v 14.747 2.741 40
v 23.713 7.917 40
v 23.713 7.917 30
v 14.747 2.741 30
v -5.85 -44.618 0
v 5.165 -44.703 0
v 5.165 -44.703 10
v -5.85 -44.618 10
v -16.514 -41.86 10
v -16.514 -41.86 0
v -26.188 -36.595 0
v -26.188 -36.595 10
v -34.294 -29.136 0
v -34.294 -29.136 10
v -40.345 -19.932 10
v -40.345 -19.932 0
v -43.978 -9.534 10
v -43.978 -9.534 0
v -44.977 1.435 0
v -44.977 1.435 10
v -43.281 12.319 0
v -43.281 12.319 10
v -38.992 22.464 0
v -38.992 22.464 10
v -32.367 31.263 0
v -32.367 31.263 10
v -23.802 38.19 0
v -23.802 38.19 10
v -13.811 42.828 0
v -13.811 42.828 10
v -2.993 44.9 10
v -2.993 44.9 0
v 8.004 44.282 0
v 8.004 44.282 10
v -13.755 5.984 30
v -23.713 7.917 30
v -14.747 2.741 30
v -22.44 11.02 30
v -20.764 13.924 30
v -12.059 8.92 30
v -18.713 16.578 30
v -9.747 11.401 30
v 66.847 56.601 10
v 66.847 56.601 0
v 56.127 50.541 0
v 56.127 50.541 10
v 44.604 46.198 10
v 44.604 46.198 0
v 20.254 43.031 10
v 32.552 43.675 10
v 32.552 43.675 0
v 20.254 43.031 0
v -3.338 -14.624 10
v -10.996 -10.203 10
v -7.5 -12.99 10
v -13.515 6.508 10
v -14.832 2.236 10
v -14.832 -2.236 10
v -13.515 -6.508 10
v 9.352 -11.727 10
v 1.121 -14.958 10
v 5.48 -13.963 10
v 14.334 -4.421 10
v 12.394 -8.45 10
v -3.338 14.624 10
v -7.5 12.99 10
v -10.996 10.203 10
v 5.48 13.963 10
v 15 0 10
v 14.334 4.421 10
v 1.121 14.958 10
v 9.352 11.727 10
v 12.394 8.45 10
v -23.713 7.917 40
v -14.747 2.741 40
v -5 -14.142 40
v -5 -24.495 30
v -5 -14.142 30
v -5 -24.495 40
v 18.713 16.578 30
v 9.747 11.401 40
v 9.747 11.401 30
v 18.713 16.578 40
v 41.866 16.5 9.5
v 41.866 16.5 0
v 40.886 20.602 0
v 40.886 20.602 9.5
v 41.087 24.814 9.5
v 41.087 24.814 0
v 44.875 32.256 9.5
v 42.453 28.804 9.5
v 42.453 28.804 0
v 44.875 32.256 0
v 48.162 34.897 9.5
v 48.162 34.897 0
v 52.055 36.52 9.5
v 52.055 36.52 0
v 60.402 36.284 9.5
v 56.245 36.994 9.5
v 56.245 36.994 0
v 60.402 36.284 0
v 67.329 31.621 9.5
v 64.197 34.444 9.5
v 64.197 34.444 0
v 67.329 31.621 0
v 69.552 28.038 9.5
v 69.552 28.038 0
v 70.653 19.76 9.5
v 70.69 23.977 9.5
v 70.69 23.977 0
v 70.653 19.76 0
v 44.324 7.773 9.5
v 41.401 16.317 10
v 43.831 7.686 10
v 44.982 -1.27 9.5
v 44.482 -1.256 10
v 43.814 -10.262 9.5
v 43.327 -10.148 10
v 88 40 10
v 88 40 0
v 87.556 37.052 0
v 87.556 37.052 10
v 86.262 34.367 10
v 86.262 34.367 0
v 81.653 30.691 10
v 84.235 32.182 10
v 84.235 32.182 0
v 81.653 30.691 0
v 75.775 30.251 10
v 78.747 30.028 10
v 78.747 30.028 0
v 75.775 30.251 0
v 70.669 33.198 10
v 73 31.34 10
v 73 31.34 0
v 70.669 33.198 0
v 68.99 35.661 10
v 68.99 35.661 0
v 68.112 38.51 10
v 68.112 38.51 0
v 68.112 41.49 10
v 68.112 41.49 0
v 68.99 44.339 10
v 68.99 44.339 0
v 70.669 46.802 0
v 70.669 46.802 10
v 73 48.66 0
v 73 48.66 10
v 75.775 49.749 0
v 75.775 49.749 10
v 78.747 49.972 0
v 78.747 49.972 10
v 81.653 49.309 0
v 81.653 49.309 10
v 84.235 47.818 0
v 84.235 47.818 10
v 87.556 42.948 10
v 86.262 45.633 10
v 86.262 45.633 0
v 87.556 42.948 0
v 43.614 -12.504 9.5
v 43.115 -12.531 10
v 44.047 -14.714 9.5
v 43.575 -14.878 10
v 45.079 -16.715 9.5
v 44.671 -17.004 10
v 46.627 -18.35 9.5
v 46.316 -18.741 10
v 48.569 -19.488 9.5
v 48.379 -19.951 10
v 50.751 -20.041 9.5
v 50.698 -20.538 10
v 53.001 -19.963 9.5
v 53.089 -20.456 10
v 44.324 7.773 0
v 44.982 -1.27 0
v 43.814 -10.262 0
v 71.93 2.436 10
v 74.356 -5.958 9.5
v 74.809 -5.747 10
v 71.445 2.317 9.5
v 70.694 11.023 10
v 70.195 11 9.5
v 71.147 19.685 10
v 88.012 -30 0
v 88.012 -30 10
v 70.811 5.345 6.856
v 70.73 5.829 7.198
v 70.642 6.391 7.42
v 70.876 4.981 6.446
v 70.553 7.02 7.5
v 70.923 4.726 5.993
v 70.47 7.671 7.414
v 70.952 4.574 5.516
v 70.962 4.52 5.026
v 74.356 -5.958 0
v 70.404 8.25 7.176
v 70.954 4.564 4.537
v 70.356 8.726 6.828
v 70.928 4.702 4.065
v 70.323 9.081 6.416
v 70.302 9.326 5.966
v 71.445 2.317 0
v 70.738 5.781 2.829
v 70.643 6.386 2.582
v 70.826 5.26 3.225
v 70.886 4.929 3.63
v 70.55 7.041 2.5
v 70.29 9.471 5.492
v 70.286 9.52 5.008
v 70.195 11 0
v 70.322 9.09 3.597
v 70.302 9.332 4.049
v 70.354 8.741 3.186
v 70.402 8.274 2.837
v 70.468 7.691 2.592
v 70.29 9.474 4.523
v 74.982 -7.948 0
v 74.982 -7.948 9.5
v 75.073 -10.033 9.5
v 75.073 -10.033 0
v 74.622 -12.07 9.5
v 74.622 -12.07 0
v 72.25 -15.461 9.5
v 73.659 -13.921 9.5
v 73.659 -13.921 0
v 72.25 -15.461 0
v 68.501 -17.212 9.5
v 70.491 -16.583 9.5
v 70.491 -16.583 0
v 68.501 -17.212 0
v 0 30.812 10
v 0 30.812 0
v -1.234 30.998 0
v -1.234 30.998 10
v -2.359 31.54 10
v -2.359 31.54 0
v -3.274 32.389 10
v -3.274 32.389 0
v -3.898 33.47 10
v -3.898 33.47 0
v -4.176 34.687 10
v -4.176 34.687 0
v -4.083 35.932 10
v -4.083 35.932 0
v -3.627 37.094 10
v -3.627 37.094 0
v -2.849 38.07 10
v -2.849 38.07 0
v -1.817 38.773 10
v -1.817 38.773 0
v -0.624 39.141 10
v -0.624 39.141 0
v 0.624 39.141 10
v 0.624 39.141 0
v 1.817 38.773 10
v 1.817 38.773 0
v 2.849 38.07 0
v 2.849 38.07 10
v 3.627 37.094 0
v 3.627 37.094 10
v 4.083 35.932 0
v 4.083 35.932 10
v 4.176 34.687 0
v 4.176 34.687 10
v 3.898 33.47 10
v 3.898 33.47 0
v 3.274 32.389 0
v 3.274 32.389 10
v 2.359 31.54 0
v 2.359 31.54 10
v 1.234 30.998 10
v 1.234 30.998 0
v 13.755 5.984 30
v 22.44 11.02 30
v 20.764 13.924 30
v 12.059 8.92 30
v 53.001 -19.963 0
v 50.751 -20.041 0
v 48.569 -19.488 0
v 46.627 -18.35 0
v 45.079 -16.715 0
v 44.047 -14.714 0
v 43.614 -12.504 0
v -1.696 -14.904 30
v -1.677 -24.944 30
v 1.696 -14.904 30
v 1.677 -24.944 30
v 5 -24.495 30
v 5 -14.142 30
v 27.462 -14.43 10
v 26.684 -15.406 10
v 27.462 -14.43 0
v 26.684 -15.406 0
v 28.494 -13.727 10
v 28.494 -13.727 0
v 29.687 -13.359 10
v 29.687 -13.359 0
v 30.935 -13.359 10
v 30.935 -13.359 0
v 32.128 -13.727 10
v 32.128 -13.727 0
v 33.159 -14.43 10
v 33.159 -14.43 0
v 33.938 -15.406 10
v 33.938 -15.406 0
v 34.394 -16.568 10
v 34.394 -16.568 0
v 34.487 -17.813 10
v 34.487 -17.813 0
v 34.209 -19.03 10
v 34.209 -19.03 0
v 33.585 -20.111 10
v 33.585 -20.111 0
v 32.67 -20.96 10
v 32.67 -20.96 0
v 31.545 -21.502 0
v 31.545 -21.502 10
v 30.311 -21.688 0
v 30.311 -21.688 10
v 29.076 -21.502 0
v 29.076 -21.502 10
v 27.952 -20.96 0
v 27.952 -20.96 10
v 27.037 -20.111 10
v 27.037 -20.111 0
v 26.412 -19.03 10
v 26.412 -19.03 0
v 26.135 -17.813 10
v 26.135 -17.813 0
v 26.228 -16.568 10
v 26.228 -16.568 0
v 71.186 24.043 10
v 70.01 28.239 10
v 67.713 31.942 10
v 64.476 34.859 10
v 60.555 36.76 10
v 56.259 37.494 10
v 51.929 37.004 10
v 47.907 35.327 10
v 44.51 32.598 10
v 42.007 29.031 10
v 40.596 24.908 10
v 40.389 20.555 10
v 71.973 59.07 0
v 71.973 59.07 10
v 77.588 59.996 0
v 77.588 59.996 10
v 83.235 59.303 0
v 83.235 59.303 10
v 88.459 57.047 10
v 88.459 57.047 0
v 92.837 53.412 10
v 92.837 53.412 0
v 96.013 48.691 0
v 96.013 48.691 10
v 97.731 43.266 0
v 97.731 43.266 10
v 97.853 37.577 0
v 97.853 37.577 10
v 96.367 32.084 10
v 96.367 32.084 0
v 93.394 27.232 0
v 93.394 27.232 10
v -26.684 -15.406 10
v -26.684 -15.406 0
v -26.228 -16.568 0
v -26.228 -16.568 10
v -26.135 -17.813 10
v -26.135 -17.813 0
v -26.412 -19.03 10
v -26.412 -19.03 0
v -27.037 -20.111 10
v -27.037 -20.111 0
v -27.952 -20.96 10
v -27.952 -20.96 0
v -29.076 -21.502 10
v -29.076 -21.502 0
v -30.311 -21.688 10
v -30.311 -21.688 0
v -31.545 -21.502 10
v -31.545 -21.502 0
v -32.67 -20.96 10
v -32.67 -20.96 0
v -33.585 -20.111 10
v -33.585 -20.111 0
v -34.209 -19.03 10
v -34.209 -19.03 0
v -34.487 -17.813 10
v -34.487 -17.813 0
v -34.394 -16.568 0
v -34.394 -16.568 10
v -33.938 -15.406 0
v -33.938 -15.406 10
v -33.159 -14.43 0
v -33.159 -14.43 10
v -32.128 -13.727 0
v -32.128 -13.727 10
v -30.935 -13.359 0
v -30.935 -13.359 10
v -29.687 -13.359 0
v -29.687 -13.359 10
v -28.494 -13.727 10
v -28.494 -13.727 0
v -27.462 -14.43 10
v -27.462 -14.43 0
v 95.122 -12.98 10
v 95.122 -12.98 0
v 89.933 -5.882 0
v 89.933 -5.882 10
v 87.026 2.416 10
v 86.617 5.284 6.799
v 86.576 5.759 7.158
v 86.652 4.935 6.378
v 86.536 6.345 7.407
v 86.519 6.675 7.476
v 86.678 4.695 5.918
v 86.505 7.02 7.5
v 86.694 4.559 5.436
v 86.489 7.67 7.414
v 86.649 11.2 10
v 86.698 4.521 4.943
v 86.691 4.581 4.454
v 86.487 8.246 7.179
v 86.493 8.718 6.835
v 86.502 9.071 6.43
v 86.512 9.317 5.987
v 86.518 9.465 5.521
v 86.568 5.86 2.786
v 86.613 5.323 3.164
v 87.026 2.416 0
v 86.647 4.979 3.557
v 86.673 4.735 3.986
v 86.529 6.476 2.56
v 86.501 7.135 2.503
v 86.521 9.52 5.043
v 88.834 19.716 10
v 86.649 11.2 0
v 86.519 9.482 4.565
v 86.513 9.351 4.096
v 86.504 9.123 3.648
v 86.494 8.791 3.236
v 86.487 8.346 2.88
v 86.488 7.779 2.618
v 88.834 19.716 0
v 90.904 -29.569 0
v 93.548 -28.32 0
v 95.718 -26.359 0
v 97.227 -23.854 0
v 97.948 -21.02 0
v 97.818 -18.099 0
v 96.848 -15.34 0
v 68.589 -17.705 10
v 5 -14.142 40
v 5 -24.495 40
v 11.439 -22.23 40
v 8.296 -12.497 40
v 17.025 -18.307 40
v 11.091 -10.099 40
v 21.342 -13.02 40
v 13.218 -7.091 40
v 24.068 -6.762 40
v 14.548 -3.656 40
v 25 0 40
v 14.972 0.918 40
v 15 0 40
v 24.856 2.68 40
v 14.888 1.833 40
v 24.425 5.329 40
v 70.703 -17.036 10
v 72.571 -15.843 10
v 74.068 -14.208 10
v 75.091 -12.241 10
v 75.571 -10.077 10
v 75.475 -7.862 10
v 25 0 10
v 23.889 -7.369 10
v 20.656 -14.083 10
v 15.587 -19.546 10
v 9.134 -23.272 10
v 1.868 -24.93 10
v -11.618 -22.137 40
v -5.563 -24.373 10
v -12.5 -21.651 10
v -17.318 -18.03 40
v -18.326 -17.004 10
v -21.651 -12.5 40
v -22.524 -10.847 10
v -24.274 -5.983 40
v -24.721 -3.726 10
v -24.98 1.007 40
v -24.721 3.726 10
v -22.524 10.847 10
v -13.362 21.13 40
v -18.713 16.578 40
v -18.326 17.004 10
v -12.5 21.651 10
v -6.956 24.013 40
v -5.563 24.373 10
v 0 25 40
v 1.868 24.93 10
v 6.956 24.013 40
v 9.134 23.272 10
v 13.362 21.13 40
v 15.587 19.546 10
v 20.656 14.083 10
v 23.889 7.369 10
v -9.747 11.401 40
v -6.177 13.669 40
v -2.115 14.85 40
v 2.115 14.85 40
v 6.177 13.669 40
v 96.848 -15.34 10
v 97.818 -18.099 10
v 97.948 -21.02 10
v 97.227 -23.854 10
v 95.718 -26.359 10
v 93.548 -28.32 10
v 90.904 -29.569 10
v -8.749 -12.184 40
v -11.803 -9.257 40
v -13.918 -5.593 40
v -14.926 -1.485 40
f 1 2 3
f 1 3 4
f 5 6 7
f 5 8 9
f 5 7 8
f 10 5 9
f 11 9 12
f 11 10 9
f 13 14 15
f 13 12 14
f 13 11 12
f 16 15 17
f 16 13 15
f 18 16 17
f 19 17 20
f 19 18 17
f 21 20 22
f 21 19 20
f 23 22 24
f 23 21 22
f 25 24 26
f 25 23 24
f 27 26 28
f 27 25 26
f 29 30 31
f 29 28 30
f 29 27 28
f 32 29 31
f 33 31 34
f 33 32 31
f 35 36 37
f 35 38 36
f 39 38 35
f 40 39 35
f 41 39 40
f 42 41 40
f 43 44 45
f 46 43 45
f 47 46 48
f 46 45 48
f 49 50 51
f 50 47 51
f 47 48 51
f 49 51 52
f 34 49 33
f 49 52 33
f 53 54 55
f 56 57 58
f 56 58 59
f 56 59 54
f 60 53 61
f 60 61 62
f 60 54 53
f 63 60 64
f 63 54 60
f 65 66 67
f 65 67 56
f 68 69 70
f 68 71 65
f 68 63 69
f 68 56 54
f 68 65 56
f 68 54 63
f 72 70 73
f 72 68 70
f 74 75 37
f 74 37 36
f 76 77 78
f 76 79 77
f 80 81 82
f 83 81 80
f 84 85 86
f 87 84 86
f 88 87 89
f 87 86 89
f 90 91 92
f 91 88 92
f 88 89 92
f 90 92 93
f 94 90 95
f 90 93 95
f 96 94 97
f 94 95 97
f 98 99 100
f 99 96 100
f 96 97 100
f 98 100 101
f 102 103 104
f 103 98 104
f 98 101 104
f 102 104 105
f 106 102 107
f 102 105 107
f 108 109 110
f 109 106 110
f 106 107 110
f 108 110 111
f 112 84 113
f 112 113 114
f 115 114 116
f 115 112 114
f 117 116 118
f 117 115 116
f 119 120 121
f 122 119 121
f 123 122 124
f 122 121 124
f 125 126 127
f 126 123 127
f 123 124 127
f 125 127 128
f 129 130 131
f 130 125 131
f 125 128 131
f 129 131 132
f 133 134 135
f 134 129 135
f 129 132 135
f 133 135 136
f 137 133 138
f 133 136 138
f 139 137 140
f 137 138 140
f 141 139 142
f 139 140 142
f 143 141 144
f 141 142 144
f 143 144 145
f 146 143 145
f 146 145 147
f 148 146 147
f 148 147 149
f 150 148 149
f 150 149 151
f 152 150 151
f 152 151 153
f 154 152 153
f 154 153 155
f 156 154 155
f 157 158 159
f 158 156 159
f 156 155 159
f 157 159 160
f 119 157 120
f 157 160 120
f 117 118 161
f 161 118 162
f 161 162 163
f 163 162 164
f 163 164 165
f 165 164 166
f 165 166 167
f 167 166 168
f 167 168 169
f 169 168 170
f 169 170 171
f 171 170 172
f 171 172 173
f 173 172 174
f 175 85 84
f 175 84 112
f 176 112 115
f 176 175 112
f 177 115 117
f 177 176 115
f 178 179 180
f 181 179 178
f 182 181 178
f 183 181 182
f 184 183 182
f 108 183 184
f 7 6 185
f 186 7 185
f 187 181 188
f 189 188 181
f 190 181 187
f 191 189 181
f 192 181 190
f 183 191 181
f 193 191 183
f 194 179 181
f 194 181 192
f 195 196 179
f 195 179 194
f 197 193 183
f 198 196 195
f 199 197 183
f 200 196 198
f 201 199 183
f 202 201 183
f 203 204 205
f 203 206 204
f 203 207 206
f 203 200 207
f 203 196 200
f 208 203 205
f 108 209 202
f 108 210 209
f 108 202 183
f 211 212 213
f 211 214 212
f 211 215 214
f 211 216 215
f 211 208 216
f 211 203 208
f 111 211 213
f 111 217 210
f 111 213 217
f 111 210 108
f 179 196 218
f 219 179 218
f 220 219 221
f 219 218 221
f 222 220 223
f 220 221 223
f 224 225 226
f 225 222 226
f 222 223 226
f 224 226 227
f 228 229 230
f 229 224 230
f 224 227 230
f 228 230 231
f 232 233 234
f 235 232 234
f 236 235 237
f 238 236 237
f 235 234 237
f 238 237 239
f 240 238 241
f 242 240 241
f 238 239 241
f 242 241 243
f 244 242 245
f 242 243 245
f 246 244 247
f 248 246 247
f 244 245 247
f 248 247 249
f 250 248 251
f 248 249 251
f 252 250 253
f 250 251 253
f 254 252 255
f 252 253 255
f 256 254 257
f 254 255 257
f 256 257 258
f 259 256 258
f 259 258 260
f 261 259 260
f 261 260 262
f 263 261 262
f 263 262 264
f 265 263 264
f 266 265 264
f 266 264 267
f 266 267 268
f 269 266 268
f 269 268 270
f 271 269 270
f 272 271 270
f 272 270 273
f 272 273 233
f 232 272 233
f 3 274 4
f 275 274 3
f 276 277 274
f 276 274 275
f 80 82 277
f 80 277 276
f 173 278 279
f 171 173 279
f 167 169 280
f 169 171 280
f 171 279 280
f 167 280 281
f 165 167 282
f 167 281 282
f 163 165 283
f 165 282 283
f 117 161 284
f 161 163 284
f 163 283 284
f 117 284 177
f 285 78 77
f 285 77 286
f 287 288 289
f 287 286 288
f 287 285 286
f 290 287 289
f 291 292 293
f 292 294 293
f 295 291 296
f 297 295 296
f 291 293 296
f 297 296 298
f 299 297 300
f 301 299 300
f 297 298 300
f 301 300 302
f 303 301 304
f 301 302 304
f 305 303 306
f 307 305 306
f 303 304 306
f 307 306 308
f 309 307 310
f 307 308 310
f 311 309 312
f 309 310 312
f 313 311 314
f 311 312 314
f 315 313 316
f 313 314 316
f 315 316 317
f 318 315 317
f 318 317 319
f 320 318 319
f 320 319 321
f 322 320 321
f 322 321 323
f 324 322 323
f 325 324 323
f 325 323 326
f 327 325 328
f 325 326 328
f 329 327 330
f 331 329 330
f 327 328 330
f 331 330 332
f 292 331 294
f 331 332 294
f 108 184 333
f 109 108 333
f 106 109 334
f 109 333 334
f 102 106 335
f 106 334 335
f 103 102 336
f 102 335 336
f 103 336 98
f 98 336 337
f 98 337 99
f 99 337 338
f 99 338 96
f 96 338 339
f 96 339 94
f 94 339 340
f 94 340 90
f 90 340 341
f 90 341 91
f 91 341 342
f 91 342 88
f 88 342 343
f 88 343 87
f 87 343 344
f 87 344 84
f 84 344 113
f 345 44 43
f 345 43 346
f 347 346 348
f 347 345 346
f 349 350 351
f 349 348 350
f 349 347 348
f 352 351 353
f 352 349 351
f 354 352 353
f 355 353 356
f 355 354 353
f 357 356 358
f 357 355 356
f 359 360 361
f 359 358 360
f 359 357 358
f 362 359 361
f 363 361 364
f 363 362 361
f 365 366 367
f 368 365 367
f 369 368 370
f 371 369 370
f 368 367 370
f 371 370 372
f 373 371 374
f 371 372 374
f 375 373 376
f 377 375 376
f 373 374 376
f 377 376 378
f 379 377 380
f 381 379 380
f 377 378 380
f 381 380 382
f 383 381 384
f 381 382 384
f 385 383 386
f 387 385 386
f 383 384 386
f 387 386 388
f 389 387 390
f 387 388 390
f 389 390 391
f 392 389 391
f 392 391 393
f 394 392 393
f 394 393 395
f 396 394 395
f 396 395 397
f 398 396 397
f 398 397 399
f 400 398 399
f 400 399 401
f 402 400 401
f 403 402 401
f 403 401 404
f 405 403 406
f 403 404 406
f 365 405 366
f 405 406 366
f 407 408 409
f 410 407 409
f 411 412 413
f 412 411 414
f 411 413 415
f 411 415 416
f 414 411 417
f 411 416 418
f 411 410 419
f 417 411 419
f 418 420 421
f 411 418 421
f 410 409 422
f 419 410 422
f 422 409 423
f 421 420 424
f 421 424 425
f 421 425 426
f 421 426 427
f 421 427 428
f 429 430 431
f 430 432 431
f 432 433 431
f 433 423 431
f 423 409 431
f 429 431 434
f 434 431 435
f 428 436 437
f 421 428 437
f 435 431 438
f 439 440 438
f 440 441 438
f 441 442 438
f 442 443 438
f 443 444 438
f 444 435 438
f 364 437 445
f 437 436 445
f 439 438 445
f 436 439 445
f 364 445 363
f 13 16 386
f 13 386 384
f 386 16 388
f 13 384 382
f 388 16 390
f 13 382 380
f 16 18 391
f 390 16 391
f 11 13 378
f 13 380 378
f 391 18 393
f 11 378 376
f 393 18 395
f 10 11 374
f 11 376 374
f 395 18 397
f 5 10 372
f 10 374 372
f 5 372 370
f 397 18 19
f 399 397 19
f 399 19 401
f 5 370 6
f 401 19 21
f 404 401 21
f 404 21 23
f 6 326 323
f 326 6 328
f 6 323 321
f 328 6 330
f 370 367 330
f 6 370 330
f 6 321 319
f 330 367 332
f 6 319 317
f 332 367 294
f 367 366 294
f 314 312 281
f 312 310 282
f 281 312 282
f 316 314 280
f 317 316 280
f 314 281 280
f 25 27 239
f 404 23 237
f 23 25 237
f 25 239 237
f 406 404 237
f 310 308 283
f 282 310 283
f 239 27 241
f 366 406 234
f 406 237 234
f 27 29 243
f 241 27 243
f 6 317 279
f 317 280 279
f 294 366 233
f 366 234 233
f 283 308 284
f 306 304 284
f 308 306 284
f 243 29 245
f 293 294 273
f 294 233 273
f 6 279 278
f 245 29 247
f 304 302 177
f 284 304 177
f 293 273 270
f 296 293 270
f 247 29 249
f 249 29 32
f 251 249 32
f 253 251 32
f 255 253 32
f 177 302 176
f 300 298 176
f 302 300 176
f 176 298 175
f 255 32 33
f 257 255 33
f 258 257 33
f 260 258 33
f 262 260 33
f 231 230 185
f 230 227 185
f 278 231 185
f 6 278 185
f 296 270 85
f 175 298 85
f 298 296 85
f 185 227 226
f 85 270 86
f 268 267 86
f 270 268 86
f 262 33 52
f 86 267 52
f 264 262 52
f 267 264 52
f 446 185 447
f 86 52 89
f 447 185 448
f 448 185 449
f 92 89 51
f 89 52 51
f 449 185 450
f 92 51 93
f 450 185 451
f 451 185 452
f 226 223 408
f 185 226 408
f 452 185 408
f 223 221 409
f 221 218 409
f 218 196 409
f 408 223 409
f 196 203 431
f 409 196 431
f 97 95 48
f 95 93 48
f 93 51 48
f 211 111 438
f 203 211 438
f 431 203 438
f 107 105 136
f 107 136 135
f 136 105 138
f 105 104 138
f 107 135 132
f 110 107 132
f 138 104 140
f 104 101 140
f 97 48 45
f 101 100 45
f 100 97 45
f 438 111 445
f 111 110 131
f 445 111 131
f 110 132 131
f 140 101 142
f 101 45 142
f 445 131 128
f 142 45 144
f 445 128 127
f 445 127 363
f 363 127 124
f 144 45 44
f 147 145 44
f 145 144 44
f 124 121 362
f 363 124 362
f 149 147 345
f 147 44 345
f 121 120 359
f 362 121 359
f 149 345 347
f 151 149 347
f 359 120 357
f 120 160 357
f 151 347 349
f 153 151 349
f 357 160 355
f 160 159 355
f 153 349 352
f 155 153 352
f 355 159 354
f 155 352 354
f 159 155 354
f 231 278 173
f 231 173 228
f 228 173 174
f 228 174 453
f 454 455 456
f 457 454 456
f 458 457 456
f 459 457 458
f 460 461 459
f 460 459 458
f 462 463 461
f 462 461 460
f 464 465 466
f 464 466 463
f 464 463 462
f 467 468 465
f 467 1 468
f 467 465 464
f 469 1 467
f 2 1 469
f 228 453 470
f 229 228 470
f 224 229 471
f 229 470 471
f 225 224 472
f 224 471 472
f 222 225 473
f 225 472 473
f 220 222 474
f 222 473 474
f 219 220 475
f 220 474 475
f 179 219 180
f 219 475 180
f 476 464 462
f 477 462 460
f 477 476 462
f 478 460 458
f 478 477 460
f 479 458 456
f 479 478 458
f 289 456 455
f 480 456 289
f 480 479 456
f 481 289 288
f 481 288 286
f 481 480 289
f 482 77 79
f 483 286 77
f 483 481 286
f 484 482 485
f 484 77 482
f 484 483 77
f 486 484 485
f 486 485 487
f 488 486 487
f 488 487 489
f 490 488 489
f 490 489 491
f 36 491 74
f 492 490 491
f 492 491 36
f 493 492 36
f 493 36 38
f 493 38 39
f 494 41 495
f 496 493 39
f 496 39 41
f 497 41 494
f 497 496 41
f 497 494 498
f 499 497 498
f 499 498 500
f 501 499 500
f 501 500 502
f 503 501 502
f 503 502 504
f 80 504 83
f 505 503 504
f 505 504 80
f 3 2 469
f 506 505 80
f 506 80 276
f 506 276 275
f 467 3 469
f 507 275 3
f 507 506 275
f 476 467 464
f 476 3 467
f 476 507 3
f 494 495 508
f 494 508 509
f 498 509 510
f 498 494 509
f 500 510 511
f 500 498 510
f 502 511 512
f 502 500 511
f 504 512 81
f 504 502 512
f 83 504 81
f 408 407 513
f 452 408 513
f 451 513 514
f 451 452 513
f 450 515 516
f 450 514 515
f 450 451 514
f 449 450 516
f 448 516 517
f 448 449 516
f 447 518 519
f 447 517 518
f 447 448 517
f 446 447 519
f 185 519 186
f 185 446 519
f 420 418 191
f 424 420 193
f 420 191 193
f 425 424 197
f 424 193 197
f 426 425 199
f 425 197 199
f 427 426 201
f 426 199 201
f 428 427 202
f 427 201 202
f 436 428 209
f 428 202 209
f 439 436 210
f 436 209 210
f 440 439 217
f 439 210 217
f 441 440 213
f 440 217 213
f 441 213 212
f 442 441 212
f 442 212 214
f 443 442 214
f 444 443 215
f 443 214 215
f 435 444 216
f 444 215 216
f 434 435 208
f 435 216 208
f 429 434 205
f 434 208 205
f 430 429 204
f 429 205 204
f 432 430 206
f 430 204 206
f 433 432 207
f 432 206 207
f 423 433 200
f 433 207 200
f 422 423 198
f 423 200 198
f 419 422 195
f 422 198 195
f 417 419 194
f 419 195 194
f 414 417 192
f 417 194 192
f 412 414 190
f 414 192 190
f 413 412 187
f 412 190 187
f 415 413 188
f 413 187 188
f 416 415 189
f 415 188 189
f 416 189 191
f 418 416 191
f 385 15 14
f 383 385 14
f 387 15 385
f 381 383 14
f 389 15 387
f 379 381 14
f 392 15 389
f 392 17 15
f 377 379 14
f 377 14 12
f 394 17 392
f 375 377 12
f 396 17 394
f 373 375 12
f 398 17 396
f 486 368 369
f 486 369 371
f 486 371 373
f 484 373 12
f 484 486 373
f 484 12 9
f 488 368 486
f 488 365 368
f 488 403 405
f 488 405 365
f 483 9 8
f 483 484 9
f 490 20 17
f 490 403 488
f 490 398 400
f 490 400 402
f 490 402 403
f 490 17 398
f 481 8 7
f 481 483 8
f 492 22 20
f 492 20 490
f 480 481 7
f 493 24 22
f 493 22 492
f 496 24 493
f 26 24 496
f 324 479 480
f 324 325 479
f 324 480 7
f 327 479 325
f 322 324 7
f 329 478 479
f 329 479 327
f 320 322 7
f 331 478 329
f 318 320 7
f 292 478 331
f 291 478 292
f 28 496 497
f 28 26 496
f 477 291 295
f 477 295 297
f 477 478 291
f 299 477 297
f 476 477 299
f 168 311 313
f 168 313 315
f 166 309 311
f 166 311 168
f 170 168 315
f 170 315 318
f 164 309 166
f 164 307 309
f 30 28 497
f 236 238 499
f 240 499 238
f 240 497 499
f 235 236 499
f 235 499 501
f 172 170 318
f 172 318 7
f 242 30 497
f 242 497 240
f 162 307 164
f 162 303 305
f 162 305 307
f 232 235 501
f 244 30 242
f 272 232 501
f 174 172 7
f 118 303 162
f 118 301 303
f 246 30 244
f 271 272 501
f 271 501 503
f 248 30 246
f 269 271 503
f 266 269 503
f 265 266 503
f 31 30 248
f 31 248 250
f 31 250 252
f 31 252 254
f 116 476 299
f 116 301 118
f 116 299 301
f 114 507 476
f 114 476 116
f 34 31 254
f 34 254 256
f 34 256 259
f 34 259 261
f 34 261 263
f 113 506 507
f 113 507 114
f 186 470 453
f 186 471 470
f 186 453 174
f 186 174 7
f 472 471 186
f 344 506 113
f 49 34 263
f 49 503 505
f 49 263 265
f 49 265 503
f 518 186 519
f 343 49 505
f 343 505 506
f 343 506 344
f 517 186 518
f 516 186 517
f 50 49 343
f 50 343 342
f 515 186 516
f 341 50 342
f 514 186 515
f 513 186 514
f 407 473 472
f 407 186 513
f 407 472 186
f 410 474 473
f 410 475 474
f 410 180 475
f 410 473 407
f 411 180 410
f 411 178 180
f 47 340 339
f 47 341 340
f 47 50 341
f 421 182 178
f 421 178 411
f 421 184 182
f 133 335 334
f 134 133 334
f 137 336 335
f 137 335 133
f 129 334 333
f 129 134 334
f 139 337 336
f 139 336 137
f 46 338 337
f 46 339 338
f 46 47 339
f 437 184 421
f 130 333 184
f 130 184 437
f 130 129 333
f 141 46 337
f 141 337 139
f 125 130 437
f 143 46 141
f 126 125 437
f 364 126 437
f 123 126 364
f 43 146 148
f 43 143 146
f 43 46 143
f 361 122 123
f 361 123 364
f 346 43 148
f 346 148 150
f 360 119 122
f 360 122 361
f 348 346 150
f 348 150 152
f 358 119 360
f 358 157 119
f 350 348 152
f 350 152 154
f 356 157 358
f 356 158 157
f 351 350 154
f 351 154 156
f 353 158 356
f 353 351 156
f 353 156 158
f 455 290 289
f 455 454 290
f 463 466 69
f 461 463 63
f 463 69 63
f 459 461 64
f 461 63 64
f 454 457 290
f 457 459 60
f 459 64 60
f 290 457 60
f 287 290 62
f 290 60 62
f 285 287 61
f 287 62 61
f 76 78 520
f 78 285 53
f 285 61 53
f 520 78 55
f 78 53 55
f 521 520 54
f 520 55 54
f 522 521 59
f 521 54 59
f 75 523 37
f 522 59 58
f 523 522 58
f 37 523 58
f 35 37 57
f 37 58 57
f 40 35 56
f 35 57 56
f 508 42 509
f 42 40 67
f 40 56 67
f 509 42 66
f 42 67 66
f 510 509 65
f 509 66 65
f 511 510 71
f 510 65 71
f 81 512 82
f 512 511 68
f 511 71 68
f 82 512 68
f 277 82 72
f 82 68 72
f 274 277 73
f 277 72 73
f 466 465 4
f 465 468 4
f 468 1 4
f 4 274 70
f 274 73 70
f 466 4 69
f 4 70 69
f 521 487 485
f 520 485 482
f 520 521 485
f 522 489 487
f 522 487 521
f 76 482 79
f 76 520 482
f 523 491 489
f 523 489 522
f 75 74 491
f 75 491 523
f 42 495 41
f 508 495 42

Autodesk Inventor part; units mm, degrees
ref_plane "YZ Plane" through (0, 0, 0) normal (1, 0, 0) x (0, 1, 0)
ref_plane "XZ Plane" through (0, 0, 0) normal (0, 1, 0) x (-1, 0, 0)
sketch "Sketch1" plane through (0, 0, 0) normal (0, 0, 1) x (1, 0, 0)
  arc A0 (93.3944, 27.2324) -> (66.8467, 56.6014) centre (78, 40) ccw
  circle A1 centre (78, 40) radius 10
  arc A2 (88.012, -30) -> (95.1215, -12.9797) centre (88, -20) ccw
  arc A3 (93.3944, 27.2324) -> (95.1215, -12.9797) centre (116.4861, 8.081) ccw
  arc A4 (70.653, 19.7601) -> (41.8659, 16.5) centre (55.8211, 22) ccw
  line L0 (5.1648, -44.7026) -> (88.012, -30)
  line L1 (53.0014, -19.9632) -> (68.5014, -17.2125)
  arc A5 (70.653, 19.7601) -> (74.3556, -5.958) centre (115.1484, 13.0405) ccw
  arc A6 (43.8143, -10.2619) -> (53.0014, -19.9632) centre (51.6035, -12.0863) ccw
  arc A7 (68.5014, -17.2125) -> (74.3556, -5.958) centre (67.1035, -9.3356) ccw
  arc A8 (8.0041, 44.2824) -> (66.8467, 56.6014) centre (22.2337, 123.0068) ccw
  arc A9 (43.8143, -10.2619) -> (41.8659, 16.5) centre (0, 0) ccw
  arc A10 (8.0041, 44.2824) -> (5.1648, -44.7026) centre (0, 0) ccw
  dimension "d1" = 40
  dimension "d2" = 20
  dimension "d3" = 40
  dimension "d4" = 78
  dimension "d5" = 20
  dimension "d6" = 20
  dimension "d7" = 88
  dimension "d8" = 60
  dimension "d10" = 30
  dimension "d11" = 22
  dimension "d19" = 16
  dimension "d22" = 15.5
  dimension "d23" = 90
  dimension "d24" = 160
  dimension "d25" = 45
  dimension "d26" = 123.0068
  dimension "d27" = 44.9174
  dimension "d28" = 8
  dimension "d29" = 8
  dimension "d31" = 45
  dimension "d32" = 31.3356
  dimension "d33" = 34.0863
  dimension "d34" = 13.0404
  dimension "d70" = 55.8211
extrude "Extrusion1" add sketch "Sketch1" along normal blind 10
sketch "Sketch2" plane through (0, 0, 10) normal (0, 0, 1) x (1, 0, 0)
  circle A0 centre (0, 0) radius 25
  circle A1 centre (0, 0) radius 15
  dimension "d37" = 50
  dimension "d38" = 30
extrude "Extrusion2" add sketch "Sketch2" along normal blind 30
sketch "Sketch3" plane through (0, 0, 40) normal (0, 0, 1) x (1, 0, 0)
  line L0 (-5, -12.5) -> (5, -12.5)
  line L1 (5, -12.5) -> (5, -27.5)
  line L2 (5, -27.5) -> (-5, -27.5)
  line L3 (-5, -27.5) -> (-5, -12.5)
  line L4 (-5, -12.5) -> (5, -27.5) construction
  line L5 (5, -12.5) -> (-5, -27.5) construction
  line L6 (13.3253, 1.9199) -> (8.3253, 10.5801)
  line L7 (26.3157, 9.4199) -> (13.3253, 1.9199)
  line L8 (8.3253, 10.5801) -> (21.3157, 18.0801)
  line L9 (21.3157, 18.0801) -> (26.3157, 9.4199)
  line L10 (-8.3253, 10.5801) -> (-13.3253, 1.9199)
  line L11 (-21.3157, 18.0801) -> (-8.3253, 10.5801)
  line L12 (-13.3253, 1.9199) -> (-26.3157, 9.4199)
  line L13 (-26.3157, 9.4199) -> (-21.3157, 18.0801)
  point P0 (0, 0)
  point P1 (0, -20)
  dimension "d41" = 20
  dimension "d42" = 10
  dimension "d43" = 15
  dimension "d44" = 12.5
  dimension "d47" = 360
extrude "Extrusion3" cut sketch "Sketch3" against normal blind 10
sketch "Sketch4" plane through (0, 0, 10) normal (0, 0, 1) x (1, 0, 0)
  point P0 (0, 0)
  point P1 (0, 35)
  dimension "d51" = 35
hole "Hole1" at (0, 35, 10) direction (0, 0, -1) diameter 8.376 end through all thread size "M10x1.5" class "6H" standard "ISO Metric profile"
ref_plane "Work Plane1" through (70.1484, 13.0405, 0) normal (-1, 0, 0) x (0, 0, 1)
sketch "Sketch5" plane through (70.1484, 13.0405, 0) normal (-1, 0, 0) x (0, 0, 1)
  circle A0 centre (5, -6.0202) radius 2.5
  line L0 (0, 14.192) -> (0, -26.0202) projected
  line L1 (0, -26.0202) -> (10, -26.0202) projected
  point P0 (0, -13.0405)
  dimension "d59" = 5
  dimension "d60" = 5
  dimension "d61" = 20
extrude "Extrusion4" cut sketch "Sketch5" against normal through all
pattern_circular "Circular Pattern1" count 3 over 360 about axis through (0, 0, 0) along (0, 0, 1) of "Hole1"
chamfer "Chamfer1" distance 0.5 angle 45 6 edges at (54.1332, 36.9047, 10) (70.6077, 6.628, 10) (74.2008, -13.0273, 10) (60.7514, -18.5878, 10) (45.7948, -17.5871, 10) (44.8812, 3.2676, 10)
properties part number "Curved disk example"
